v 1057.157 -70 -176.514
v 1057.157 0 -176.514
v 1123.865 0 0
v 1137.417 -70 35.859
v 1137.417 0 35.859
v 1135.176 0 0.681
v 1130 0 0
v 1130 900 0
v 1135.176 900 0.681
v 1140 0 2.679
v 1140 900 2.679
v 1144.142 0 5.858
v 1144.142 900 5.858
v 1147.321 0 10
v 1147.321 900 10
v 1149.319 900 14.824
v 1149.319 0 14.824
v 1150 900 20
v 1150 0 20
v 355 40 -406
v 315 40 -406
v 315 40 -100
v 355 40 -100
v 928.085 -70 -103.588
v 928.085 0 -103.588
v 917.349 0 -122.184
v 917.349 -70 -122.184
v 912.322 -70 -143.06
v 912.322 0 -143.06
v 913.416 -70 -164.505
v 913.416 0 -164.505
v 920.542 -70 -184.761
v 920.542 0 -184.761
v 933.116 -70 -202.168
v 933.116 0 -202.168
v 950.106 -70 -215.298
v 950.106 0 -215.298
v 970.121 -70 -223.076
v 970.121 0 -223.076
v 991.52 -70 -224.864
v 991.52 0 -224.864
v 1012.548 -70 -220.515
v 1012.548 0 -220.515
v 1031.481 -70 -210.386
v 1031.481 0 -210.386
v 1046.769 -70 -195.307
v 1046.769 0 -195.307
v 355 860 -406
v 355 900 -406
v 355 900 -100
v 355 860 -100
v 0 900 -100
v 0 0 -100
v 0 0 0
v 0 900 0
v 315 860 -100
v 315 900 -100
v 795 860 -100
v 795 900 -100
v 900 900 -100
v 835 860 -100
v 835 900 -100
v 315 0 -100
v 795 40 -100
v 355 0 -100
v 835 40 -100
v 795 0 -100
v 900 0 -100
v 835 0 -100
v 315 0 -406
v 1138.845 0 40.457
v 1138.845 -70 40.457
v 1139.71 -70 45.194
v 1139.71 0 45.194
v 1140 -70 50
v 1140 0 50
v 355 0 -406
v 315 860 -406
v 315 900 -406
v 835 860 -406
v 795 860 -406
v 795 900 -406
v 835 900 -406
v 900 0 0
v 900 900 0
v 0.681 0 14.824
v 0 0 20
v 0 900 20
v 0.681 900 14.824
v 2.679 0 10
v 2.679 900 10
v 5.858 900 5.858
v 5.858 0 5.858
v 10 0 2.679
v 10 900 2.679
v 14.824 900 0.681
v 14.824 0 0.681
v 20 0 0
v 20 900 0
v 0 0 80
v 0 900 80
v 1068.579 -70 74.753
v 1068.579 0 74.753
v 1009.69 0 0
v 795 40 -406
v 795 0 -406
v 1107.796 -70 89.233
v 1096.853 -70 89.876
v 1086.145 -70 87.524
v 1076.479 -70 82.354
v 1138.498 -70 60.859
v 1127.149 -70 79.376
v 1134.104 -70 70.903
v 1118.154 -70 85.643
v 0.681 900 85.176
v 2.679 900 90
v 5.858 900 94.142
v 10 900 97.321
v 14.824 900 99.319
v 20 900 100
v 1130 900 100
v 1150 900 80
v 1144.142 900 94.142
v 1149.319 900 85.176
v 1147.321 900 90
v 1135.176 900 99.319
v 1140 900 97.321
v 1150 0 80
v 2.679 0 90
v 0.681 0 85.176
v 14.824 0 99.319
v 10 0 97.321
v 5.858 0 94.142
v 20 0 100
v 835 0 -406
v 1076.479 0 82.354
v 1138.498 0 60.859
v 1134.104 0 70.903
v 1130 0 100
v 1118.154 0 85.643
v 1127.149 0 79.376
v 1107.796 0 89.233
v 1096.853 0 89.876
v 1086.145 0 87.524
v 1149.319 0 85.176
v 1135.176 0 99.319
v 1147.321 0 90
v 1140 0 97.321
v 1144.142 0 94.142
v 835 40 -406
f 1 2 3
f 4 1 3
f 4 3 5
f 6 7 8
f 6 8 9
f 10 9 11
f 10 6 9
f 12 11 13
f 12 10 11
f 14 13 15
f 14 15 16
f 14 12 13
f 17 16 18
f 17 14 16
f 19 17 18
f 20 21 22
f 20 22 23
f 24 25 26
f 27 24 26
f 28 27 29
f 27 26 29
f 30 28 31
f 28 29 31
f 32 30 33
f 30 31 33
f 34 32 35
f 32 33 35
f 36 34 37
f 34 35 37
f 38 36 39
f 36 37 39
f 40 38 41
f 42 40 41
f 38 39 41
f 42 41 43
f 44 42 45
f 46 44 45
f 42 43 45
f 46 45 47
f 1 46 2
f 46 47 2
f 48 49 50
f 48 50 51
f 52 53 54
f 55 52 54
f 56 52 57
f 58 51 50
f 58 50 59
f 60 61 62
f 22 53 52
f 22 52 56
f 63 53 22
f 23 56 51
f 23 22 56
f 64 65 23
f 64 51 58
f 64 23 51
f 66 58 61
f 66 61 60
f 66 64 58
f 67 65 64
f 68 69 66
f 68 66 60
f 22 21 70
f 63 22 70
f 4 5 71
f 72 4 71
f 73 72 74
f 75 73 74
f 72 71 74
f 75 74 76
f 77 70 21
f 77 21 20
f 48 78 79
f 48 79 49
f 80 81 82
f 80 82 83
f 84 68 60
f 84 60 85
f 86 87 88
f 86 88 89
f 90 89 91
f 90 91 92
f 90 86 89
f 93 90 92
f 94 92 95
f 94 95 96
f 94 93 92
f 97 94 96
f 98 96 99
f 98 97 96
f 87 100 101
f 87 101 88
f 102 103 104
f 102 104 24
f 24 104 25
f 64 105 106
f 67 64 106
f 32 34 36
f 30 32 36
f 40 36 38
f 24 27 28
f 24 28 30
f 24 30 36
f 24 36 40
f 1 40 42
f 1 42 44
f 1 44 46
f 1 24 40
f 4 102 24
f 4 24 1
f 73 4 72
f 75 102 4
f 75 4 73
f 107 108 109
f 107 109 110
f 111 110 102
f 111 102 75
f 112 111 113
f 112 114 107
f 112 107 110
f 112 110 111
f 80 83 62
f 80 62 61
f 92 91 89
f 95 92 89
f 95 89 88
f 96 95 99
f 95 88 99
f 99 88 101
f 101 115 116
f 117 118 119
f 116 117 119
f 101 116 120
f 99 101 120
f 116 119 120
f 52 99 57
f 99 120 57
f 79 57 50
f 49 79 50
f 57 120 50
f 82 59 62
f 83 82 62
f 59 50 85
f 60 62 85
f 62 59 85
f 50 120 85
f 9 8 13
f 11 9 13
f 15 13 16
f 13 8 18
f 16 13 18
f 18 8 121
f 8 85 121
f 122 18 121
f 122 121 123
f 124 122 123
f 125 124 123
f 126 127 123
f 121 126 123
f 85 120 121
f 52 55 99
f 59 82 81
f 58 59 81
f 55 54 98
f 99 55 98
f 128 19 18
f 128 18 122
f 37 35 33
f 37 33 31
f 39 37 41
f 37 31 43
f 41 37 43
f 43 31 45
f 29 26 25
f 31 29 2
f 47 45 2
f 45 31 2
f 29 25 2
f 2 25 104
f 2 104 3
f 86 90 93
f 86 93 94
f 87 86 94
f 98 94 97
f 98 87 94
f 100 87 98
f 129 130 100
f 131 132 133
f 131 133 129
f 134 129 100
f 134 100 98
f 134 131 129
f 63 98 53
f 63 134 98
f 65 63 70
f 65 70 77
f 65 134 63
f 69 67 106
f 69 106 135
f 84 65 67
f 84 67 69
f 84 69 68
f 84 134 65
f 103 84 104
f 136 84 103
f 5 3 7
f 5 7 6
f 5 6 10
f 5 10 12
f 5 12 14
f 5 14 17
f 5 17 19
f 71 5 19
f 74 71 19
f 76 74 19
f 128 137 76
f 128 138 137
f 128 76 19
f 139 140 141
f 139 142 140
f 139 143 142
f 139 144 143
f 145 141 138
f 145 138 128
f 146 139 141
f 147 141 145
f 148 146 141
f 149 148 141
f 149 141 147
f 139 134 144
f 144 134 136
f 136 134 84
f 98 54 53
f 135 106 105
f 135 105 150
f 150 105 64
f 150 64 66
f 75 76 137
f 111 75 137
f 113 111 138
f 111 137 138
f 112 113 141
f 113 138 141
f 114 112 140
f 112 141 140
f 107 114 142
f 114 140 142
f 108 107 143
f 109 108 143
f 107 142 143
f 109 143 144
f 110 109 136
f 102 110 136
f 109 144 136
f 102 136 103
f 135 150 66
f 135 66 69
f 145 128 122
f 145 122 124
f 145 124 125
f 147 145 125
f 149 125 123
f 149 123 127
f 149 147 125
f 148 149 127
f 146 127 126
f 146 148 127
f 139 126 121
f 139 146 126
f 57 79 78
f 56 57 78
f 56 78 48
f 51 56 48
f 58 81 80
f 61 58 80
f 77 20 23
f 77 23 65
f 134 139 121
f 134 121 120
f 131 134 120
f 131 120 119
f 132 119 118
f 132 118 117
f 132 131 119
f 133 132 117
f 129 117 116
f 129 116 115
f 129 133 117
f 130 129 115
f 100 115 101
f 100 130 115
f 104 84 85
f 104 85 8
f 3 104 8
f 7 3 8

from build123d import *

# Parameters (mm, degrees)
F1_DEPTH = 900
F2_W     = 900
F2_H     = 100
F3_DEPTH = 900
F5_DEPTH = 70
F7_W     = 40
F7_H     = 40
F8_DEPTH = 306


with BuildPart() as f1:
    # F0 (on Front) → F1 (new body)
    with BuildSketch(Plane.XZ):
        with BuildLine():
            ThreePointArc((0, 20), (5.8578643763, 5.8578643763), (20, 0))
            Line((20, 0), (1130, 0))
            ThreePointArc((1130, 0), (1144.1421356237, 5.8578643763), (1150, 20))
            Line((1150, 20), (1150, 80))
            ThreePointArc((1150, 80), (1144.1421356237, 94.1421356237), (1130, 100))
            Line((1130, 100), (20, 100))
            ThreePointArc((20, 100), (5.8578643763, 94.1421356237), (0, 80))
            Line((0, 80), (0, 20))
        make_face()
    extrude(amount=-F1_DEPTH)

    # F2 (on Front) → F3 (join, through all)
    with BuildSketch(Plane.XZ):
        with Locations((450, -50)):
            Rectangle(F2_W, F2_H)
    extrude(amount=-F3_DEPTH)

    # F4 (on face) → F5 (join)
    with BuildSketch(Plane.XZ):
        with BuildLine():
            ThreePointArc((1137.4171255462, 35.8593240664), (1139.3489836073, 42.8126855449), (1140, 50))
            ThreePointArc((1140, 50), (1113.0987167635, 87.7944919155), (1068.5788190425, 74.752967241))
            ThreePointArc((1068.5788190425, 74.752967241), (1080.3234477683, 15.1742438377), (1137.4171255462, 35.8593240664))
        make_face()
        with BuildLine():
            ThreePointArc((1137.4171255462, 35.8593240664), (1080.3234477683, 15.1742438377), (1068.5788190425, 74.752967241))
            Line((1068.5788190425, 74.752967241), (928.0852857046, -103.5881864231))
            ThreePointArc((928.0852857046, -103.5881864231), (1011.5600939315, -79.1353276584), (1062, -150))
            ThreePointArc((1062, -150), (1060.7793442636, -163.4762146032), (1057.1571103991, -176.5137673755))
            Line((1057.1571103991, -176.5137673755), (1137.4171255462, 35.8593240664))
        make_face()
        with BuildLine():
            ThreePointArc((1062, -150), (1011.5600939315, -79.1353276584), (928.0852857046, -103.5881864231))
            ThreePointArc((928.0852857046, -103.5881864231), (950.1064645656, -215.2982928043), (1057.1571103991, -176.5137673755))
            ThreePointArc((1057.1571103991, -176.5137673755), (1060.7793442636, -163.4762146032), (1062, -150))
        make_face()
    extrude(amount=F5_DEPTH)

    # F7 (on offset) → F8 (join, through all)
    with BuildSketch(Plane(origin=(0, 0, -406), x_dir=(1, 0, 0), z_dir=(0, 0, -1))):
        with Locations((335, -20.0000000002)):
            Rectangle(F7_W, F7_H)
        with Locations((335, -880.0000000002)):
            Rectangle(F7_W, F7_H)
        with Locations((815, -20.0000000002)):
            Rectangle(F7_W, F7_H)
        with Locations((815, -880.0000000002)):
            Rectangle(F7_W, F7_H)
    extrude(amount=-F8_DEPTH)


solid = f1.part
